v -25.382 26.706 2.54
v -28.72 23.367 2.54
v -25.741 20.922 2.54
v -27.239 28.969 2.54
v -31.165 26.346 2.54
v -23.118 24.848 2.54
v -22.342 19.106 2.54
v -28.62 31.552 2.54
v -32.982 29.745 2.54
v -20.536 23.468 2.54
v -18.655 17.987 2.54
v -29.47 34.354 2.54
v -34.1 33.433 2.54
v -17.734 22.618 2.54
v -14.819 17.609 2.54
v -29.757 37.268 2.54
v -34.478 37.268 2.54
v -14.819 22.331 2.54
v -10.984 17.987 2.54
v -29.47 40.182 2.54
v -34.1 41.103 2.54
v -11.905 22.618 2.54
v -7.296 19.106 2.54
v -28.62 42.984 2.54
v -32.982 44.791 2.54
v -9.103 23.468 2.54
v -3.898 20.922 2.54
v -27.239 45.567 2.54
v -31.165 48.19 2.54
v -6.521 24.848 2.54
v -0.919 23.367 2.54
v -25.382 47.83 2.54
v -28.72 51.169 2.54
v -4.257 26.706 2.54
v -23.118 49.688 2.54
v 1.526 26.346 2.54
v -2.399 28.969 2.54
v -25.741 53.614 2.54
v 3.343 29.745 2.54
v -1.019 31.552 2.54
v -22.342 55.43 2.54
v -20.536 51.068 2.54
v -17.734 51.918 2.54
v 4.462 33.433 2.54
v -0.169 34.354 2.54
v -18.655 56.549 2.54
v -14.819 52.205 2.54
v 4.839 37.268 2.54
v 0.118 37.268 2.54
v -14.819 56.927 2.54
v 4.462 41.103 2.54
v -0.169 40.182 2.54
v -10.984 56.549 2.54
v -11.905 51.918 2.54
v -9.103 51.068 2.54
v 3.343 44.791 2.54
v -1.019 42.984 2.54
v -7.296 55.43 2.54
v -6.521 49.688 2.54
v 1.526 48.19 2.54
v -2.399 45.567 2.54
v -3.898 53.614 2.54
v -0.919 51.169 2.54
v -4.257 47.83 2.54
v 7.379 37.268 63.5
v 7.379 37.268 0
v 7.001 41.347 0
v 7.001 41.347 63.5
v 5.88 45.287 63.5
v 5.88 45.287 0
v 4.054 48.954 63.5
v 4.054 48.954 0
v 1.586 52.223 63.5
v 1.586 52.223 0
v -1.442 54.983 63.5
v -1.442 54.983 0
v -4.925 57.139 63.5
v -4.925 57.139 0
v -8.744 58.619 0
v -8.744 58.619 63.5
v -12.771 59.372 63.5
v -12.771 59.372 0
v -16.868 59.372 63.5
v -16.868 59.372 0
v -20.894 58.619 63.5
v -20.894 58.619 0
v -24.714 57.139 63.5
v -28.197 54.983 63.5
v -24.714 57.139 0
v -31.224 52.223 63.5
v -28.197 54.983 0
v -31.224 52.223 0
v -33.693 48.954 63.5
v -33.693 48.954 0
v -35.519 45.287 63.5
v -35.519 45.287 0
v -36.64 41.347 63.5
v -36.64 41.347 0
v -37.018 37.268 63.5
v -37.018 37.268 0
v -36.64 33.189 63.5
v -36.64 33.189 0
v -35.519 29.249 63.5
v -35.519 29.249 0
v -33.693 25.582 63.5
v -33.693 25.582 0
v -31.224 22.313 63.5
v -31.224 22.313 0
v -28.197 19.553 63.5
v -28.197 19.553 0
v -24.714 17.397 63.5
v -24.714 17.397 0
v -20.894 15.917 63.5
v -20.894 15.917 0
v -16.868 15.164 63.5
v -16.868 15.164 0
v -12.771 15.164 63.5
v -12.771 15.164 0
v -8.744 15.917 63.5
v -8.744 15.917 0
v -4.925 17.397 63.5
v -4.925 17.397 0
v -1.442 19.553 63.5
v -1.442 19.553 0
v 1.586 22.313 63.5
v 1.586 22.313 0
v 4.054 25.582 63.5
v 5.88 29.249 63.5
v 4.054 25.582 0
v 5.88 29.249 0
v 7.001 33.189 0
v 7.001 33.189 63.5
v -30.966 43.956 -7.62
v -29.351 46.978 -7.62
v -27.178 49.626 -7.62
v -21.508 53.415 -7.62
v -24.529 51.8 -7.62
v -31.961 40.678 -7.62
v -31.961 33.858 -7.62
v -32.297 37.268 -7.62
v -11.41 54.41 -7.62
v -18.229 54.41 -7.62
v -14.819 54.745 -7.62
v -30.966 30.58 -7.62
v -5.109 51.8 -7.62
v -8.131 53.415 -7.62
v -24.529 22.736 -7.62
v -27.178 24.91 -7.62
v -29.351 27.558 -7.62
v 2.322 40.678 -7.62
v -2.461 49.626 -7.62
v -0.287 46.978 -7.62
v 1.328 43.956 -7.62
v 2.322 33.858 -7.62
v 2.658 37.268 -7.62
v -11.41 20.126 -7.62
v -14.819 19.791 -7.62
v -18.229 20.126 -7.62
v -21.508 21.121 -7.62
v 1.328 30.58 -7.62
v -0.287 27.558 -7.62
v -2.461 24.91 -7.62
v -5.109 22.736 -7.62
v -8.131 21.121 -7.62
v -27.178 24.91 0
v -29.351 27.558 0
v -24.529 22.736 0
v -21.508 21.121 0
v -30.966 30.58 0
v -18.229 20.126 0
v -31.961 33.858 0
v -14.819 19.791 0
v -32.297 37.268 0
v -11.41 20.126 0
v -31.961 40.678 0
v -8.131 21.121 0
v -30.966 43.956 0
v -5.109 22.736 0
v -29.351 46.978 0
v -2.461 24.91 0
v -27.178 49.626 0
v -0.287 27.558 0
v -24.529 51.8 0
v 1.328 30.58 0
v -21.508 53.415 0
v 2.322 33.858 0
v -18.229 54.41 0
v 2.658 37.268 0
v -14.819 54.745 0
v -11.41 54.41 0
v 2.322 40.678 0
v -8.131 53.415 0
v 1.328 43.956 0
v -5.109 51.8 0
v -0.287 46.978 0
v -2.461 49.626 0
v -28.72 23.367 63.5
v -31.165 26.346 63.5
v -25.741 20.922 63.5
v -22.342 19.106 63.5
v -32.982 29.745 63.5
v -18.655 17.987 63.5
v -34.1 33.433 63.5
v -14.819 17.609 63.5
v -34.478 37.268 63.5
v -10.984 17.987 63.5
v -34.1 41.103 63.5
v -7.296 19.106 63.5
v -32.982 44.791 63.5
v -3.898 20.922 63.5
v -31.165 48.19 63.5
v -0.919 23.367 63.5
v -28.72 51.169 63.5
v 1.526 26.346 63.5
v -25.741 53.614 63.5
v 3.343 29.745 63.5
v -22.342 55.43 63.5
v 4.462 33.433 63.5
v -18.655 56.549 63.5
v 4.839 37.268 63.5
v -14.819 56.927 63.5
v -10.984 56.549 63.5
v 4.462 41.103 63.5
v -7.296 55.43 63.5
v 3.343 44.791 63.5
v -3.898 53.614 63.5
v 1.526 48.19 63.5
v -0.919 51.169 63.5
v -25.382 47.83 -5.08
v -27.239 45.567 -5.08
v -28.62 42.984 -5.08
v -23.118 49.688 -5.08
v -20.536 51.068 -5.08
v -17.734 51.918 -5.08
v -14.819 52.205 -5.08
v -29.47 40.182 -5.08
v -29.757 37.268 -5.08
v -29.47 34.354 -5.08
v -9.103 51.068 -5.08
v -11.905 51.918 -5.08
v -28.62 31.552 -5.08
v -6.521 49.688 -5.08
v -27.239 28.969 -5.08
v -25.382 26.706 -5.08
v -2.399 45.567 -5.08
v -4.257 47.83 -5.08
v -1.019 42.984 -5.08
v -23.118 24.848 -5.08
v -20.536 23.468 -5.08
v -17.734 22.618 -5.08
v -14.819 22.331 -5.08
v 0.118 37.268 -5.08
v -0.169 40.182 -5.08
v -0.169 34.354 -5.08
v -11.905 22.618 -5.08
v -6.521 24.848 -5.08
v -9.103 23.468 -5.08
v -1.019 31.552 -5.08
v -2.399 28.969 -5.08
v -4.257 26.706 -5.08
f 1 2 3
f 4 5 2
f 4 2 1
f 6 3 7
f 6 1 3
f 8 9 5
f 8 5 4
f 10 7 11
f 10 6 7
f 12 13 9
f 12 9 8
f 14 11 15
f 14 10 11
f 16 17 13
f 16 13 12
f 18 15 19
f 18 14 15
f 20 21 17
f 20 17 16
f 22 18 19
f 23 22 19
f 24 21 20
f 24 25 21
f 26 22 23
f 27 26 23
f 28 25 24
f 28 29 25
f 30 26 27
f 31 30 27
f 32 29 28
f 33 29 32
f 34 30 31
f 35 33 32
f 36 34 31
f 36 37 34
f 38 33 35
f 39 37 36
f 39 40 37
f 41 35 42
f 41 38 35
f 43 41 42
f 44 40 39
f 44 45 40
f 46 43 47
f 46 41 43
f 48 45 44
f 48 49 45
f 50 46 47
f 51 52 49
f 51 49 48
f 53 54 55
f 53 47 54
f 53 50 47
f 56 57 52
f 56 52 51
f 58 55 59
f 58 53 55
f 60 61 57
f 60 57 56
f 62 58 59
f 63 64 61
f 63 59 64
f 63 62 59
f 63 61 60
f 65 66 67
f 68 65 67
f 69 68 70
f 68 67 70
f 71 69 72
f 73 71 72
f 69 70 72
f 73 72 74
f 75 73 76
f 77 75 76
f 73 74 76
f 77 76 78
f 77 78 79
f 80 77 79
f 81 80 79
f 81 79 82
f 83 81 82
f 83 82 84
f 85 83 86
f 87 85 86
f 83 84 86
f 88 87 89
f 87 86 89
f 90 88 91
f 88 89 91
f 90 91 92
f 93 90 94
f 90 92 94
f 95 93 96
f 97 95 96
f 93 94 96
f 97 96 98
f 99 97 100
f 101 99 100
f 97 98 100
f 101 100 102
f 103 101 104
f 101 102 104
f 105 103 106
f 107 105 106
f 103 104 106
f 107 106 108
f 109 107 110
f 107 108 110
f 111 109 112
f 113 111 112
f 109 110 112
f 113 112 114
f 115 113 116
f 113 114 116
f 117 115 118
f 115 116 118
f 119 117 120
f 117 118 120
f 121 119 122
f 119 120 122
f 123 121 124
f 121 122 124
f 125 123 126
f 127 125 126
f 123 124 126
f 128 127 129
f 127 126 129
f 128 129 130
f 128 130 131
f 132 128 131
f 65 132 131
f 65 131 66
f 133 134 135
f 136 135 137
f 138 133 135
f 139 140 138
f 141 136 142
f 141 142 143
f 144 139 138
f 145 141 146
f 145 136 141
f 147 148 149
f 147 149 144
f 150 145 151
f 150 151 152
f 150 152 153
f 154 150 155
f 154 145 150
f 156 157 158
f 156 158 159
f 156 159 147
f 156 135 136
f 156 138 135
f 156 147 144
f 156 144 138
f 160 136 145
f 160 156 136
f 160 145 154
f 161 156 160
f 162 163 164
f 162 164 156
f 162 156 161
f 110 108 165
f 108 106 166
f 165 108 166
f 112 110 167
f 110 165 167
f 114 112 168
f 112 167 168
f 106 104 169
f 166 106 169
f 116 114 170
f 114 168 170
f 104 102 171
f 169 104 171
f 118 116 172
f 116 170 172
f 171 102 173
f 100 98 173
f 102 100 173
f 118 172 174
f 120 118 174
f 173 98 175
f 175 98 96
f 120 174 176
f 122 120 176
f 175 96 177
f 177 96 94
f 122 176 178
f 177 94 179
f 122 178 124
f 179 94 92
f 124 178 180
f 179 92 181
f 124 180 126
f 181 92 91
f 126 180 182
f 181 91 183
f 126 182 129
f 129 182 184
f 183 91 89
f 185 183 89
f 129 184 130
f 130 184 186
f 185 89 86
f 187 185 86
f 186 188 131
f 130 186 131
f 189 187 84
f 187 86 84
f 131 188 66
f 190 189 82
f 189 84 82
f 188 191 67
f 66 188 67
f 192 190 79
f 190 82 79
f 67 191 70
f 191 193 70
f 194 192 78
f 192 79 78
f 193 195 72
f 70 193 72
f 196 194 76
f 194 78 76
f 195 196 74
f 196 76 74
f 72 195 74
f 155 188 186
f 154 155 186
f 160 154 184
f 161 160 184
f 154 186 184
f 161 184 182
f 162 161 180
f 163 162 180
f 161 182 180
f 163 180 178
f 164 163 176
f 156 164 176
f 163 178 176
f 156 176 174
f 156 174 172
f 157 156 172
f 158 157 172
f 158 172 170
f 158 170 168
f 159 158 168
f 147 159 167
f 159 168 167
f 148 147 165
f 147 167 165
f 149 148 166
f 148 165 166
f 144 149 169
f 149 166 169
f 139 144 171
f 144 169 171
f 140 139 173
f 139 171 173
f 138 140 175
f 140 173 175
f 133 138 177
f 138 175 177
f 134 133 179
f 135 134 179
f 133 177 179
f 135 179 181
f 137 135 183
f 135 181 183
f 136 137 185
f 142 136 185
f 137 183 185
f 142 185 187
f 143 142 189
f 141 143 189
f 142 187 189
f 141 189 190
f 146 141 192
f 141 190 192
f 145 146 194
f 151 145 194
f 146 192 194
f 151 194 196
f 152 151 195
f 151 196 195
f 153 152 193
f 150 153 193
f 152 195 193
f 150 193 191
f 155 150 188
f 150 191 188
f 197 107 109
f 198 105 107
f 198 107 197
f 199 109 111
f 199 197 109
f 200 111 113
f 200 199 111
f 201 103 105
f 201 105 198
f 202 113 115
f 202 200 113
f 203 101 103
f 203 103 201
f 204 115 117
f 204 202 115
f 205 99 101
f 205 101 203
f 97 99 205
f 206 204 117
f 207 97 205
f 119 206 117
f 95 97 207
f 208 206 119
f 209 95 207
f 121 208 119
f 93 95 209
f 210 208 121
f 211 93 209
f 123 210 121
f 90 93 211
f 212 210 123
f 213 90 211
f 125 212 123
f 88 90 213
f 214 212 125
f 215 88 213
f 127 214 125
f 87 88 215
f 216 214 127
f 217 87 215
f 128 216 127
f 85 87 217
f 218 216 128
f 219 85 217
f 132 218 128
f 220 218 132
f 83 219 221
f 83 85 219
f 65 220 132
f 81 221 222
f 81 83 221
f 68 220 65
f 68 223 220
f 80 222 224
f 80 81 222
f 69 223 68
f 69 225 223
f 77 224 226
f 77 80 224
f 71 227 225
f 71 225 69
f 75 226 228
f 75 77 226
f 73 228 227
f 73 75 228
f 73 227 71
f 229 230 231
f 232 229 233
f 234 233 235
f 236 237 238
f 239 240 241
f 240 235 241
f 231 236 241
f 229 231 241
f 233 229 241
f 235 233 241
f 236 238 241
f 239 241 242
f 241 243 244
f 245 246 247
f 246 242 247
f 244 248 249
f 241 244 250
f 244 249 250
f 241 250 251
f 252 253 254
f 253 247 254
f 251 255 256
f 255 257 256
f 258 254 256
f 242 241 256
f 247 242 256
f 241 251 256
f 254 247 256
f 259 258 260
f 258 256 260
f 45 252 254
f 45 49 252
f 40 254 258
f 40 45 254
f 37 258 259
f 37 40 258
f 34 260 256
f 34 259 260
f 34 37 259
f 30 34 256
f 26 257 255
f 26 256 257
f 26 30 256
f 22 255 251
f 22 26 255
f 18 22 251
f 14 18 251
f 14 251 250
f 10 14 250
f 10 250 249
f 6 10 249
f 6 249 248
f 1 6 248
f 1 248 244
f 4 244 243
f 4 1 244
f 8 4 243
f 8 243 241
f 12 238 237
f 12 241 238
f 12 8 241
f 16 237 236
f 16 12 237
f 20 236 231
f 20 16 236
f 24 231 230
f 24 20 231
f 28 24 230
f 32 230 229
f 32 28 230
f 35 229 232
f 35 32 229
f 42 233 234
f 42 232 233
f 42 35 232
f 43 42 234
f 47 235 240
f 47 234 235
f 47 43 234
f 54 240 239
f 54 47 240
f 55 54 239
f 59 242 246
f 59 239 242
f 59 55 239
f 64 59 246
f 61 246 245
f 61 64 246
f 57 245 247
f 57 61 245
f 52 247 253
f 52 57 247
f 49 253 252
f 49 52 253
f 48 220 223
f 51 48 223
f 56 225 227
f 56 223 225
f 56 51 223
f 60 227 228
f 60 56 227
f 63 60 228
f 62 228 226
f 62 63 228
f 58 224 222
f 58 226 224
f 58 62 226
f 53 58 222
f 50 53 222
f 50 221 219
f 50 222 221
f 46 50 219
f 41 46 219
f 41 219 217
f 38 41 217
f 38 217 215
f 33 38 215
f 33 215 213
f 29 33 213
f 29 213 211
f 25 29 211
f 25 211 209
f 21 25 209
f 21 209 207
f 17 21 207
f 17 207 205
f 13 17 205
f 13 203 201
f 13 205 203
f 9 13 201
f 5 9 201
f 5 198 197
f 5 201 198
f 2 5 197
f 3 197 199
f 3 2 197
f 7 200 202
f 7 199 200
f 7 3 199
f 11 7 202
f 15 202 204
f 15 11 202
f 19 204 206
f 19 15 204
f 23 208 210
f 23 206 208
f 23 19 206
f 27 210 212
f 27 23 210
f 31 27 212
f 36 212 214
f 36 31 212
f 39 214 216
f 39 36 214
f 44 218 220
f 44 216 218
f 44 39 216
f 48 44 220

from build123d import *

# Parameters (mm, degrees)
F0_R     = 22.198621642
F1_DEPTH = 63.5
F2_R     = 17.4774608617
F3_DEPTH = 7.62
F4_T     = -2.54


with BuildPart() as f1:
    # F0 (on Top) → F1 (new body)
    with BuildSketch(Plane.XY):
        with Locations((-14.8193594068, 37.2680351138)):
            Circle(F0_R)
    extrude(amount=F1_DEPTH)

    # F2 (on face) → F3 (join)
    with BuildSketch(Plane(origin=(0, 0, 0), x_dir=(1, 0, 0), z_dir=(0, 0, -1))):
        with Locations((-14.8193594068, -37.2680351138)):
            Circle(F2_R)
    extrude(amount=F3_DEPTH)

    # F4
    f4_openings = [f1.faces().sort_by_distance(p)[0] for p in [
        (-14.819359, 37.268035, 63.5),
    ]]
    offset(amount=F4_T, openings=f4_openings, kind=Kind.INTERSECTION)


solid = f1.part
